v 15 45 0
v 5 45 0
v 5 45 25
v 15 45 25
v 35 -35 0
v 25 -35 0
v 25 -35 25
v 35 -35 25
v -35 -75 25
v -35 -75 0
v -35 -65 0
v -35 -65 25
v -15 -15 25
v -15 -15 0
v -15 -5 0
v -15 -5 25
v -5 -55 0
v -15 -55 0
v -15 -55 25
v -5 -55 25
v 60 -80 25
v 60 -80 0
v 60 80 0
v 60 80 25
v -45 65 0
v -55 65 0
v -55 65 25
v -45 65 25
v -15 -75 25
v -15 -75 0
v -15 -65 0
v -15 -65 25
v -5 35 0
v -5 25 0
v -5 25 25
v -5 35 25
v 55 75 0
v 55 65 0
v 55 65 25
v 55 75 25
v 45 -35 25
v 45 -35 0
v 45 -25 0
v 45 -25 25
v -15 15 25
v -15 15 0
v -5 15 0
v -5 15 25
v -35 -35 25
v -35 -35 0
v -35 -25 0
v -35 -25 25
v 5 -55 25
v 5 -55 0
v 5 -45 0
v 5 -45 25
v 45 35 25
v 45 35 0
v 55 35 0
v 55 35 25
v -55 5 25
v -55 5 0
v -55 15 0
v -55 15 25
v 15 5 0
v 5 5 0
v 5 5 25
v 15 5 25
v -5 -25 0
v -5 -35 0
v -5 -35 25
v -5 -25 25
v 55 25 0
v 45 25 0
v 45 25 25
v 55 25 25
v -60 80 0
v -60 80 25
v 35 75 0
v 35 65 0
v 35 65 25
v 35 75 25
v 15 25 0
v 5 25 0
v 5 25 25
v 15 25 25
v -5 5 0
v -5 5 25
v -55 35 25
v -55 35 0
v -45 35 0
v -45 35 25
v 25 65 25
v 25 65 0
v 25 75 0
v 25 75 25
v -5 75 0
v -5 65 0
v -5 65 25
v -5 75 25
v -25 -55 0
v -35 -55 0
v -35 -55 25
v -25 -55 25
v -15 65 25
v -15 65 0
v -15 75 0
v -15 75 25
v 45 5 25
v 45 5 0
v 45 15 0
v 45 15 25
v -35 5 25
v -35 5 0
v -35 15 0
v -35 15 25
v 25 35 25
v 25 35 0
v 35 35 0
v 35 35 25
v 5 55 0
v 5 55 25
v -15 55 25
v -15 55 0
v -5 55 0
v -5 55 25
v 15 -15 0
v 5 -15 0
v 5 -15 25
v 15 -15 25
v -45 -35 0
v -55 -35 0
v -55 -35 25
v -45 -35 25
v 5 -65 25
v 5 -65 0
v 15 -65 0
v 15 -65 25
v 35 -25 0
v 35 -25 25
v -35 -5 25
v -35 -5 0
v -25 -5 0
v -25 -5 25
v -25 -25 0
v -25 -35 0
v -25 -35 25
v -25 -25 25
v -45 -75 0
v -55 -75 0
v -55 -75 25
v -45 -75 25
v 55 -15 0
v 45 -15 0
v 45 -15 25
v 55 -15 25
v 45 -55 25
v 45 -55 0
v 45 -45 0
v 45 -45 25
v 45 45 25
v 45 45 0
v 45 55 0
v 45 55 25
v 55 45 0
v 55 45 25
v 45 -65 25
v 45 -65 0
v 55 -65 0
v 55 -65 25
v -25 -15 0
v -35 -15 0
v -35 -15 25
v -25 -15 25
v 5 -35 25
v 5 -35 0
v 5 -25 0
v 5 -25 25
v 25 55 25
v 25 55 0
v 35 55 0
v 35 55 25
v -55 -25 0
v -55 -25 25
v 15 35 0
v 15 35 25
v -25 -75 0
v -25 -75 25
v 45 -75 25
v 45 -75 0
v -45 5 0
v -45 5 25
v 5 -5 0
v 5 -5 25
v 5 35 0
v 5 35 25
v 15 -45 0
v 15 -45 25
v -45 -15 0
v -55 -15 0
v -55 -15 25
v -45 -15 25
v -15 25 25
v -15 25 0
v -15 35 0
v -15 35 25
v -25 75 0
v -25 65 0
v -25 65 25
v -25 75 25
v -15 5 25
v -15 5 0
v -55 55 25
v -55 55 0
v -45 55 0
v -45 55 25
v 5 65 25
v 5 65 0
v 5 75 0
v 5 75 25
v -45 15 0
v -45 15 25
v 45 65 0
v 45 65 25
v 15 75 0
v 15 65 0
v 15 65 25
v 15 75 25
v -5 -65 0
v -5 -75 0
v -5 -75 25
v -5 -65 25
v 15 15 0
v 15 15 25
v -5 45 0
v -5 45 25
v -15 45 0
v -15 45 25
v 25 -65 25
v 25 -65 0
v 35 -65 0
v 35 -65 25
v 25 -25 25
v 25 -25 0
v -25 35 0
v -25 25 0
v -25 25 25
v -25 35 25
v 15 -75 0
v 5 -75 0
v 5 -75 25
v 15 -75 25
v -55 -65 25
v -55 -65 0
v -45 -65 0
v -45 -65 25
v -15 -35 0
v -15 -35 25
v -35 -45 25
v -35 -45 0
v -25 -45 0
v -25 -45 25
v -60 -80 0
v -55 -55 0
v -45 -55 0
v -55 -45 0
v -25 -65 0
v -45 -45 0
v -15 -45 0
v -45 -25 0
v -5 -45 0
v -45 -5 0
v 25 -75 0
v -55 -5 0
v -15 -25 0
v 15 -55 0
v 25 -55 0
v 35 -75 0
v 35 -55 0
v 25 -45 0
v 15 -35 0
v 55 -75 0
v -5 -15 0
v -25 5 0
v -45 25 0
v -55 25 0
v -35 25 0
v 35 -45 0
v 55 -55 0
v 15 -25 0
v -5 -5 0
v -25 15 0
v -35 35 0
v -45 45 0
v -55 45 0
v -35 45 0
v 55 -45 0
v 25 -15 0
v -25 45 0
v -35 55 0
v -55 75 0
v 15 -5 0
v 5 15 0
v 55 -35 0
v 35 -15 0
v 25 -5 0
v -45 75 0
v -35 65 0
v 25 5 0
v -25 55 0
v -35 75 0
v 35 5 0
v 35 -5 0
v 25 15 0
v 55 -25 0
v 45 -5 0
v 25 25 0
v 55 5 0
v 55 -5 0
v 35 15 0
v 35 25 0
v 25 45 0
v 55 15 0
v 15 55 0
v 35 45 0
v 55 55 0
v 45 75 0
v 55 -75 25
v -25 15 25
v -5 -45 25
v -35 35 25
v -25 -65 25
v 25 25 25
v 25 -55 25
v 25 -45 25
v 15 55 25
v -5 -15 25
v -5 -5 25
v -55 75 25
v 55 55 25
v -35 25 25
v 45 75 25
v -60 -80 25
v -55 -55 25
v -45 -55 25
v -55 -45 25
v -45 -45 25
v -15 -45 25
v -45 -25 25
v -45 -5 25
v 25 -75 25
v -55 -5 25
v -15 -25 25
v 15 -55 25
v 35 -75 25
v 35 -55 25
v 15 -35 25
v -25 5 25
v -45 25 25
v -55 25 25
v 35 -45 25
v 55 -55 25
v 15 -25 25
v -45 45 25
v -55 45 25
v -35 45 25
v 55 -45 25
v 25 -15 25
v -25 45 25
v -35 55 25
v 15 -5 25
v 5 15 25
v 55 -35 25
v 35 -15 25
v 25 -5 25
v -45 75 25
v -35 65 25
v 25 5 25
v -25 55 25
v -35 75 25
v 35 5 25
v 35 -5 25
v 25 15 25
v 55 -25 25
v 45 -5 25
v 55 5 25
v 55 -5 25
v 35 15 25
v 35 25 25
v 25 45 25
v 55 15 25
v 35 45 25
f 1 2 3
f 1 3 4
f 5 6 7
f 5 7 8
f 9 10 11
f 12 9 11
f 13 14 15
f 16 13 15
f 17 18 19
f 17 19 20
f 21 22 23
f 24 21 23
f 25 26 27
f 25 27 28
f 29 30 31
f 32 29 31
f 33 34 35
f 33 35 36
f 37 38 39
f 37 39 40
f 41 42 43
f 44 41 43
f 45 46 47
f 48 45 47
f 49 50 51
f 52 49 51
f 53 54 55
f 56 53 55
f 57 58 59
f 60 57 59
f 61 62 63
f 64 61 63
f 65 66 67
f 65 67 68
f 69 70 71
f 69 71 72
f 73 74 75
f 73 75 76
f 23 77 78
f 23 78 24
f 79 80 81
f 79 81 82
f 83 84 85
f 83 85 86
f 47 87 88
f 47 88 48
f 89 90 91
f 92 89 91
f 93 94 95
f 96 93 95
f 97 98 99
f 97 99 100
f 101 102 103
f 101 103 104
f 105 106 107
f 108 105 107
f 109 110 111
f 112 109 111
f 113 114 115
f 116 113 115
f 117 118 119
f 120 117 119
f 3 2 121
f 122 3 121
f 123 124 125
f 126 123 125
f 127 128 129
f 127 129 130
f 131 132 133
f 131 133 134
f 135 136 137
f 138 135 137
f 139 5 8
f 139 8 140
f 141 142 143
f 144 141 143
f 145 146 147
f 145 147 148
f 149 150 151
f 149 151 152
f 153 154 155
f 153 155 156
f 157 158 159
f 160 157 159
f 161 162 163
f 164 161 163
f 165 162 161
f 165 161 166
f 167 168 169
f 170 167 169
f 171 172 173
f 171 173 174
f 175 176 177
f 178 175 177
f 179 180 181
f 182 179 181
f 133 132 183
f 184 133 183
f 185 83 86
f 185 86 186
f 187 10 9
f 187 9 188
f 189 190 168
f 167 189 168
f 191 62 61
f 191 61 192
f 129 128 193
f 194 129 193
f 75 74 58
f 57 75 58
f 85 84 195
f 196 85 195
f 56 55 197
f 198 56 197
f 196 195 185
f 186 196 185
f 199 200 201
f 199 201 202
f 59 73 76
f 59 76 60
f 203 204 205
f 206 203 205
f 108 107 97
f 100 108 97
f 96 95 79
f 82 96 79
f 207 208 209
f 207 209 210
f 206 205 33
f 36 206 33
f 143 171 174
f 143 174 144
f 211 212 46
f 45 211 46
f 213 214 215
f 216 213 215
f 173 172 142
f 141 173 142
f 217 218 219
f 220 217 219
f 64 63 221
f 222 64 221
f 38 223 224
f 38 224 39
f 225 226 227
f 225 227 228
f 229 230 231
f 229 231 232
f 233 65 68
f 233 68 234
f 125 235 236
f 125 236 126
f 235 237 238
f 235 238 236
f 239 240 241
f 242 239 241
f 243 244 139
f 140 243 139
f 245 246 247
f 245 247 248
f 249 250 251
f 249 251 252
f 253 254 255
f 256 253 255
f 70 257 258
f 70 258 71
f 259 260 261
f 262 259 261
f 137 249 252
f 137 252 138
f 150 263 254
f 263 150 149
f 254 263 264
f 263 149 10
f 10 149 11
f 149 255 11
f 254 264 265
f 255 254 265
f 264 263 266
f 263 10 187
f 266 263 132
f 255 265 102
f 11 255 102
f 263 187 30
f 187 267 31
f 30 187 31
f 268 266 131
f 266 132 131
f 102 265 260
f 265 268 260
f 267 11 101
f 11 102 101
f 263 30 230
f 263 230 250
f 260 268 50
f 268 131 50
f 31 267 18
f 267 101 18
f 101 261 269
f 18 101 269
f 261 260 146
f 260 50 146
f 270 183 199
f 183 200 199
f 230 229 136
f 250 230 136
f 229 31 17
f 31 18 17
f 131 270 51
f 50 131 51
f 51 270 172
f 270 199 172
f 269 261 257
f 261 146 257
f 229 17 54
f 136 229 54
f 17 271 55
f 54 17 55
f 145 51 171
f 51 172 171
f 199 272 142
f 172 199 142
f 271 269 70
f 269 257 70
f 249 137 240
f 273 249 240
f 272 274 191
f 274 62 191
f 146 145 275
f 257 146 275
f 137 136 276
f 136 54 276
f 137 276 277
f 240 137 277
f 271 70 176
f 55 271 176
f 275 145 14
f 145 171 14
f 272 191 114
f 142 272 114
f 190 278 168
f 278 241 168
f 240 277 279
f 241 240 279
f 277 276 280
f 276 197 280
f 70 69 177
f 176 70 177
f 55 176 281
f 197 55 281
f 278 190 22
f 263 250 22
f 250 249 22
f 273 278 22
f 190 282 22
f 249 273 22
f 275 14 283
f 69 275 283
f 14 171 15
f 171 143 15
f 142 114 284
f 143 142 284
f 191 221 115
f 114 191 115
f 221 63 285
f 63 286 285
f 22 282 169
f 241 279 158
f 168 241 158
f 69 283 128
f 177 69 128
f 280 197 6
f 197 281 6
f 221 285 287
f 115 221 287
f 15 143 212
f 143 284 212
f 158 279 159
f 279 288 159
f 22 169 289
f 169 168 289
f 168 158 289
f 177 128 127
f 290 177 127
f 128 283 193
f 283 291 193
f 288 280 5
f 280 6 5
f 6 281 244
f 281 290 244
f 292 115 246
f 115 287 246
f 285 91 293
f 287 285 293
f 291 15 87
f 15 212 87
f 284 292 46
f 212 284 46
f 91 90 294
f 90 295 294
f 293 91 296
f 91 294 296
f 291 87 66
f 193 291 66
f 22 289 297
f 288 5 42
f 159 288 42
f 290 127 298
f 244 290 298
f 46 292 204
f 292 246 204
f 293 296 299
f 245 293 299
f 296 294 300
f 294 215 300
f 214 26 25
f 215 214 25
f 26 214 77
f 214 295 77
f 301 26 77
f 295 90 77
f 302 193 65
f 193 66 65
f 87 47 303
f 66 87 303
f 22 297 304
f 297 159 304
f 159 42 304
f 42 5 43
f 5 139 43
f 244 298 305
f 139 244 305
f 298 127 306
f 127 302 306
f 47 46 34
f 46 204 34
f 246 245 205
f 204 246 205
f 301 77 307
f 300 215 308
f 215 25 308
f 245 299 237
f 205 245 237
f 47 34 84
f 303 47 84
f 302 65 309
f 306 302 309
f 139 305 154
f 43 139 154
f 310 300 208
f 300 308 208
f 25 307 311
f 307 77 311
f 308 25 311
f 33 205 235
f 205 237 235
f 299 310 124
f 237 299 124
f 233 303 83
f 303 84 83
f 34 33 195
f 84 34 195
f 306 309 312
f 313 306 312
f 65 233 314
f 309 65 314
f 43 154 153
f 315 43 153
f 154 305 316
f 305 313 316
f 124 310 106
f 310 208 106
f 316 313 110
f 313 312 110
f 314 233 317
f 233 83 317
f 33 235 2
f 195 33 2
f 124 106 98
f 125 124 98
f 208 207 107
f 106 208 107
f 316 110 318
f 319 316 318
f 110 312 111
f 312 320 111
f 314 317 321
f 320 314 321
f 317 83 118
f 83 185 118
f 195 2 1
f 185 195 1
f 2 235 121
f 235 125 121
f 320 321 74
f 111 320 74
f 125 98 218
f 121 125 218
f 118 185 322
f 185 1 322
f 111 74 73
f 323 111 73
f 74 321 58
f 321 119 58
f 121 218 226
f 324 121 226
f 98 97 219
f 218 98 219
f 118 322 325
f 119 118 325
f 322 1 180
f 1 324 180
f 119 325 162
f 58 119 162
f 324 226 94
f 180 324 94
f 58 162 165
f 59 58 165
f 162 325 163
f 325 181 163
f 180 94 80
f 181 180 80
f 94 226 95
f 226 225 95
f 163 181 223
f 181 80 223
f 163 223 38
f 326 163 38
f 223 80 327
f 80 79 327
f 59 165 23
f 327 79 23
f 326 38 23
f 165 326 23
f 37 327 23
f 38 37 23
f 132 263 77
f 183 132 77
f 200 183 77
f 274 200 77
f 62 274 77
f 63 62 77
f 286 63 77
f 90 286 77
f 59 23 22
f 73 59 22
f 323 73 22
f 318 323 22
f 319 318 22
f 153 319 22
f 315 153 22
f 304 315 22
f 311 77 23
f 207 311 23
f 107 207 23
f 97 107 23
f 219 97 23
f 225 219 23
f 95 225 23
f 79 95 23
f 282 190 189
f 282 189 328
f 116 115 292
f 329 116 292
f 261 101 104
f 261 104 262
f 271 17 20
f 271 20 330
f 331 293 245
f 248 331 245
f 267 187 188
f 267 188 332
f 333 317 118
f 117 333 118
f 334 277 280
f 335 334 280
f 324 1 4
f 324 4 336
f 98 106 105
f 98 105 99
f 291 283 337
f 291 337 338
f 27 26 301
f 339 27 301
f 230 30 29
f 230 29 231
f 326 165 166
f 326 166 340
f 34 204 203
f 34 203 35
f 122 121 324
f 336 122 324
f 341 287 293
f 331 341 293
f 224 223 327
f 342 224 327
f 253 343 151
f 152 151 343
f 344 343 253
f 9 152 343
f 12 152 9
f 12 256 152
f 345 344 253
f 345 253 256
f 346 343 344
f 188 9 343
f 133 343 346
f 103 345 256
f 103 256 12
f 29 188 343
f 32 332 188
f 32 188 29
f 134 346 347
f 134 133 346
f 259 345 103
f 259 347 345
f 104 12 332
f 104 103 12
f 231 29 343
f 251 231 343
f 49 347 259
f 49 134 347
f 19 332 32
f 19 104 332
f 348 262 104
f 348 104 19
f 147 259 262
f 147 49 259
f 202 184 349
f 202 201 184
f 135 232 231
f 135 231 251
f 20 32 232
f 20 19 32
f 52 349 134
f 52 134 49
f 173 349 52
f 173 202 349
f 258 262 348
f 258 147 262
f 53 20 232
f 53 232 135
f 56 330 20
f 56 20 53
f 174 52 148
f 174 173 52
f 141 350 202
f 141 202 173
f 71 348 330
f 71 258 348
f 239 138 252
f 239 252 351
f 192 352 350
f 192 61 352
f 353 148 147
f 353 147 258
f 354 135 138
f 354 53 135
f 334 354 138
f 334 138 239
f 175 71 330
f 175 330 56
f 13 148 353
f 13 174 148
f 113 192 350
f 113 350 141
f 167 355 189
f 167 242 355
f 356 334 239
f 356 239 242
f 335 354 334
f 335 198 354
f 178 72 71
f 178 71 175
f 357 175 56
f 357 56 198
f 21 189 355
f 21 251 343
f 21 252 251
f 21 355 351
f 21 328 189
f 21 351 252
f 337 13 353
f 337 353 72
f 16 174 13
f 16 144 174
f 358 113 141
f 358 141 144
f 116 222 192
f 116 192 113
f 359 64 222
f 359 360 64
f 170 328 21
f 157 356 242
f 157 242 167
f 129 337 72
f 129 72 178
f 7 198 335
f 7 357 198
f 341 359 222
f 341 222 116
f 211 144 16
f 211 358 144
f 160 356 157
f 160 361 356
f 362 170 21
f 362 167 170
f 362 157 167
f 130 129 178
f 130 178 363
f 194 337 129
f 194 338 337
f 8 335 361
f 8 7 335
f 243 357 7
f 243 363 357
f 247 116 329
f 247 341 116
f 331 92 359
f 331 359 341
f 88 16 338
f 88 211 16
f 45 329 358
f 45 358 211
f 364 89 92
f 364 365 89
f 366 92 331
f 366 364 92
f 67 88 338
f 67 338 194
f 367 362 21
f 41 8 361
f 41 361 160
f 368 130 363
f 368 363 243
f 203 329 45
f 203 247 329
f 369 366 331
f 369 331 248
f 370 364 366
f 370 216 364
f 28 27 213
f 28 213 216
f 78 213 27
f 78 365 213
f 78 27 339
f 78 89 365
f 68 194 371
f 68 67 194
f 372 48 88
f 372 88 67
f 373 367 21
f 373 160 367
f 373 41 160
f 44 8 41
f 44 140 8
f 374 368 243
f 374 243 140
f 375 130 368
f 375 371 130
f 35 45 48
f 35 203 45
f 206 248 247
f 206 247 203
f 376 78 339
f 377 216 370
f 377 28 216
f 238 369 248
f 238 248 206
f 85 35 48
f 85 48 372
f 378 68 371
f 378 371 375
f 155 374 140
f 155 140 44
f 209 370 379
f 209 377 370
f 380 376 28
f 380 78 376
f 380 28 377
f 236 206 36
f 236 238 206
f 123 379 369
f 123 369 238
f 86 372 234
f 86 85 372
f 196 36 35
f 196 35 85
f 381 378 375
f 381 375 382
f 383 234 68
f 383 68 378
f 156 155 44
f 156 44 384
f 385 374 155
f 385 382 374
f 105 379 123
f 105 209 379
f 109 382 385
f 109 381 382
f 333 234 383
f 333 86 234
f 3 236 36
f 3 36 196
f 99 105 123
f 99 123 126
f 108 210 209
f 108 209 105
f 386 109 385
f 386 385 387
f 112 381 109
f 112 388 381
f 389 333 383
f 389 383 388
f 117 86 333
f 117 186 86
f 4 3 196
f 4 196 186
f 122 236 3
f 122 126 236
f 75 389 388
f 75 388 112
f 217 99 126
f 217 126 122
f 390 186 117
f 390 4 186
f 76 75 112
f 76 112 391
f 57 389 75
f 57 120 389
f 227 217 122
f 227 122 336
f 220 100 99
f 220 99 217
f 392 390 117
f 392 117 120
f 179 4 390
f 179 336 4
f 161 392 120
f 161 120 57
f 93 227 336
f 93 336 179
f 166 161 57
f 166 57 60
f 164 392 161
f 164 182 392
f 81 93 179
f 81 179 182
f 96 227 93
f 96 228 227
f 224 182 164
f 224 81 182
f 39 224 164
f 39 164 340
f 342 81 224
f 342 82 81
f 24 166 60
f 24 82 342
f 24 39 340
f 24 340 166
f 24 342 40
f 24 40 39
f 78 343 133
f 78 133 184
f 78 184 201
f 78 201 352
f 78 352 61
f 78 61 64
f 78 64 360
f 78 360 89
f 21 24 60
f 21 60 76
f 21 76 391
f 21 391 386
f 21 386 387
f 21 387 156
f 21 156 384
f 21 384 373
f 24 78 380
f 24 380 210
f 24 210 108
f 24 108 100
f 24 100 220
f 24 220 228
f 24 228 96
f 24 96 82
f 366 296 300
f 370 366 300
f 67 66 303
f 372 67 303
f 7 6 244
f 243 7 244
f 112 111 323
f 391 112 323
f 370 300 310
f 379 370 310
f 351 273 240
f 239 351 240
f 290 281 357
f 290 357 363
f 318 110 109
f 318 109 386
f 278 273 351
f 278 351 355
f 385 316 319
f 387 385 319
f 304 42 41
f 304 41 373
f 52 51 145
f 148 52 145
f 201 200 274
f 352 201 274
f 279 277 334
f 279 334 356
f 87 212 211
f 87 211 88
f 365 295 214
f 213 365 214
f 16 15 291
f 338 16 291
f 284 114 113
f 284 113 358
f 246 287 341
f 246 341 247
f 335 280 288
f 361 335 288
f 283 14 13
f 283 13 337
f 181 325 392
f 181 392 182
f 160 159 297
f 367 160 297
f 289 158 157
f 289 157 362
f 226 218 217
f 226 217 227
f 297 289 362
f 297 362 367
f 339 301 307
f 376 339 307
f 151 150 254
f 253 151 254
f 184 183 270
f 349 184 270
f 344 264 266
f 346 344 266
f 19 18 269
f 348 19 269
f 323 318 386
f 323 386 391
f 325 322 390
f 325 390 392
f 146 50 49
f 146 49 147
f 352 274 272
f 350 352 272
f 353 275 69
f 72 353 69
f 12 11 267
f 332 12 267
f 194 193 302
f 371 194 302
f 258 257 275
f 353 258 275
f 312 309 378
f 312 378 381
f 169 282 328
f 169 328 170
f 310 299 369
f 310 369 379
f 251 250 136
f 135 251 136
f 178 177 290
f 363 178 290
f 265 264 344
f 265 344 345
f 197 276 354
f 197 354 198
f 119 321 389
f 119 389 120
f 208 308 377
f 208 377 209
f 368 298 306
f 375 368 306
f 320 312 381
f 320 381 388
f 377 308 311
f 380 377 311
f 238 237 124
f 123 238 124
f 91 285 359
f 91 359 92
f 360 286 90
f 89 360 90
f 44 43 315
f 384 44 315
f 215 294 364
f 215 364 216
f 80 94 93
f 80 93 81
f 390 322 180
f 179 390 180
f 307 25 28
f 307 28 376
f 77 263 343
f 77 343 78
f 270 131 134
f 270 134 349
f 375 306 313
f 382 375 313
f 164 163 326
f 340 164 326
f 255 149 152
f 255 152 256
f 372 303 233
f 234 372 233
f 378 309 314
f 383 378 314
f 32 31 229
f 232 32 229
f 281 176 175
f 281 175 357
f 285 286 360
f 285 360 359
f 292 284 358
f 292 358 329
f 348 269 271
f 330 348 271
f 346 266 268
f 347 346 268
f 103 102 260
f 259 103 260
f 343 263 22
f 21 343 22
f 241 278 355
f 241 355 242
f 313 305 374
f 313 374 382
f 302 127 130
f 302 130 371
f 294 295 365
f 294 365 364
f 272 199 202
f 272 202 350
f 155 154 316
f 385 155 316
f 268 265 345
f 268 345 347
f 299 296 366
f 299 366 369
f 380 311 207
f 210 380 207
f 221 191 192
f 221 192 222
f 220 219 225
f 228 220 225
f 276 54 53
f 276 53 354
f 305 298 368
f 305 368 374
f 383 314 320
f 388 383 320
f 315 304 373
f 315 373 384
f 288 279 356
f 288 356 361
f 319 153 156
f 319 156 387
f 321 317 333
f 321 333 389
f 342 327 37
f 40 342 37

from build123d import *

# Parameters (mm, degrees)
F0_W     = 120
F0_H     = 160
F0_W_2   = 10
F0_H_2   = 10
F1_DEPTH = 25


with BuildPart() as f1:
    # F0 (on Top) → F1 (new body)
    with BuildSketch(Plane.XY):
        Rectangle(F0_W, F0_H)
        with Locations((-50, -70)):
            Rectangle(F0_W_2, F0_H_2, mode=Mode.SUBTRACT)
        with Locations((-50, -50)):
            Rectangle(F0_W_2, F0_H_2, mode=Mode.SUBTRACT)
        with Locations((-30, -70)):
            Rectangle(F0_W_2, F0_H_2, mode=Mode.SUBTRACT)
        with Locations((-10, -70)):
            Rectangle(F0_W_2, F0_H_2, mode=Mode.SUBTRACT)
        with Locations((-30, -50)):
            Rectangle(F0_W_2, F0_H_2, mode=Mode.SUBTRACT)
        with Locations((-10, -50)):
            Rectangle(F0_W_2, F0_H_2, mode=Mode.SUBTRACT)
        with Locations((-50, -30)):
            Rectangle(F0_W_2, F0_H_2, mode=Mode.SUBTRACT)
        with Locations((-50, -10)):
            Rectangle(F0_W_2, F0_H_2, mode=Mode.SUBTRACT)
        with Locations((-30, -30)):
            Rectangle(F0_W_2, F0_H_2, mode=Mode.SUBTRACT)
        with Locations((-10, -30)):
            Rectangle(F0_W_2, F0_H_2, mode=Mode.SUBTRACT)
        with Locations((-30, -10)):
            Rectangle(F0_W_2, F0_H_2, mode=Mode.SUBTRACT)
        with Locations((-10, -10)):
            Rectangle(F0_W_2, F0_H_2, mode=Mode.SUBTRACT)
        with Locations((10, -70)):
            Rectangle(F0_W_2, F0_H_2, mode=Mode.SUBTRACT)
        with Locations((10, -50)):
            Rectangle(F0_W_2, F0_H_2, mode=Mode.SUBTRACT)
        with Locations((30, -70)):
            Rectangle(F0_W_2, F0_H_2, mode=Mode.SUBTRACT)
        with Locations((50, -70)):
            Rectangle(F0_W_2, F0_H_2, mode=Mode.SUBTRACT)
        with Locations((30, -50)):
            Rectangle(F0_W_2, F0_H_2, mode=Mode.SUBTRACT)
        with Locations((50, -50)):
            Rectangle(F0_W_2, F0_H_2, mode=Mode.SUBTRACT)
        with Locations((10, -30)):
            Rectangle(F0_W_2, F0_H_2, mode=Mode.SUBTRACT)
        with Locations((10, -10)):
            Rectangle(F0_W_2, F0_H_2, mode=Mode.SUBTRACT)
        with Locations((30, -30)):
            Rectangle(F0_W_2, F0_H_2, mode=Mode.SUBTRACT)
        with Locations((50, -30)):
            Rectangle(F0_W_2, F0_H_2, mode=Mode.SUBTRACT)
        with Locations((30, -10)):
            Rectangle(F0_W_2, F0_H_2, mode=Mode.SUBTRACT)
        with Locations((50, -10)):
            Rectangle(F0_W_2, F0_H_2, mode=Mode.SUBTRACT)
        with Locations((-50, 10)):
            Rectangle(F0_W_2, F0_H_2, mode=Mode.SUBTRACT)
        with Locations((-50, 30)):
            Rectangle(F0_W_2, F0_H_2, mode=Mode.SUBTRACT)
        with Locations((-30, 10)):
            Rectangle(F0_W_2, F0_H_2, mode=Mode.SUBTRACT)
        with Locations((-10, 10)):
            Rectangle(F0_W_2, F0_H_2, mode=Mode.SUBTRACT)
        with Locations((-30, 30)):
            Rectangle(F0_W_2, F0_H_2, mode=Mode.SUBTRACT)
        with Locations((-10, 30)):
            Rectangle(F0_W_2, F0_H_2, mode=Mode.SUBTRACT)
        with Locations((-50, 50)):
            Rectangle(F0_W_2, F0_H_2, mode=Mode.SUBTRACT)
        with Locations((-50, 70)):
            Rectangle(F0_W_2, F0_H_2, mode=Mode.SUBTRACT)
        with Locations((-30, 50)):
            Rectangle(F0_W_2, F0_H_2, mode=Mode.SUBTRACT)
        with Locations((-10, 50)):
            Rectangle(F0_W_2, F0_H_2, mode=Mode.SUBTRACT)
        with Locations((-30, 70)):
            Rectangle(F0_W_2, F0_H_2, mode=Mode.SUBTRACT)
        with Locations((-10, 70)):
            Rectangle(F0_W_2, F0_H_2, mode=Mode.SUBTRACT)
        with Locations((10, 10)):
            Rectangle(F0_W_2, F0_H_2, mode=Mode.SUBTRACT)
        with Locations((10, 30)):
            Rectangle(F0_W_2, F0_H_2, mode=Mode.SUBTRACT)
        with Locations((30, 10)):
            Rectangle(F0_W_2, F0_H_2, mode=Mode.SUBTRACT)
        with Locations((50, 10)):
            Rectangle(F0_W_2, F0_H_2, mode=Mode.SUBTRACT)
        with Locations((30, 30)):
            Rectangle(F0_W_2, F0_H_2, mode=Mode.SUBTRACT)
        with Locations((50, 30)):
            Rectangle(F0_W_2, F0_H_2, mode=Mode.SUBTRACT)
        with Locations((10, 50)):
            Rectangle(F0_W_2, F0_H_2, mode=Mode.SUBTRACT)
        with Locations((10, 70)):
            Rectangle(F0_W_2, F0_H_2, mode=Mode.SUBTRACT)
        with Locations((30, 50)):
            Rectangle(F0_W_2, F0_H_2, mode=Mode.SUBTRACT)
        with Locations((50, 50)):
            Rectangle(F0_W_2, F0_H_2, mode=Mode.SUBTRACT)
        with Locations((30, 70)):
            Rectangle(F0_W_2, F0_H_2, mode=Mode.SUBTRACT)
        with Locations((50, 70)):
            Rectangle(F0_W_2, F0_H_2, mode=Mode.SUBTRACT)
    extrude(amount=F1_DEPTH)


solid = f1.part
